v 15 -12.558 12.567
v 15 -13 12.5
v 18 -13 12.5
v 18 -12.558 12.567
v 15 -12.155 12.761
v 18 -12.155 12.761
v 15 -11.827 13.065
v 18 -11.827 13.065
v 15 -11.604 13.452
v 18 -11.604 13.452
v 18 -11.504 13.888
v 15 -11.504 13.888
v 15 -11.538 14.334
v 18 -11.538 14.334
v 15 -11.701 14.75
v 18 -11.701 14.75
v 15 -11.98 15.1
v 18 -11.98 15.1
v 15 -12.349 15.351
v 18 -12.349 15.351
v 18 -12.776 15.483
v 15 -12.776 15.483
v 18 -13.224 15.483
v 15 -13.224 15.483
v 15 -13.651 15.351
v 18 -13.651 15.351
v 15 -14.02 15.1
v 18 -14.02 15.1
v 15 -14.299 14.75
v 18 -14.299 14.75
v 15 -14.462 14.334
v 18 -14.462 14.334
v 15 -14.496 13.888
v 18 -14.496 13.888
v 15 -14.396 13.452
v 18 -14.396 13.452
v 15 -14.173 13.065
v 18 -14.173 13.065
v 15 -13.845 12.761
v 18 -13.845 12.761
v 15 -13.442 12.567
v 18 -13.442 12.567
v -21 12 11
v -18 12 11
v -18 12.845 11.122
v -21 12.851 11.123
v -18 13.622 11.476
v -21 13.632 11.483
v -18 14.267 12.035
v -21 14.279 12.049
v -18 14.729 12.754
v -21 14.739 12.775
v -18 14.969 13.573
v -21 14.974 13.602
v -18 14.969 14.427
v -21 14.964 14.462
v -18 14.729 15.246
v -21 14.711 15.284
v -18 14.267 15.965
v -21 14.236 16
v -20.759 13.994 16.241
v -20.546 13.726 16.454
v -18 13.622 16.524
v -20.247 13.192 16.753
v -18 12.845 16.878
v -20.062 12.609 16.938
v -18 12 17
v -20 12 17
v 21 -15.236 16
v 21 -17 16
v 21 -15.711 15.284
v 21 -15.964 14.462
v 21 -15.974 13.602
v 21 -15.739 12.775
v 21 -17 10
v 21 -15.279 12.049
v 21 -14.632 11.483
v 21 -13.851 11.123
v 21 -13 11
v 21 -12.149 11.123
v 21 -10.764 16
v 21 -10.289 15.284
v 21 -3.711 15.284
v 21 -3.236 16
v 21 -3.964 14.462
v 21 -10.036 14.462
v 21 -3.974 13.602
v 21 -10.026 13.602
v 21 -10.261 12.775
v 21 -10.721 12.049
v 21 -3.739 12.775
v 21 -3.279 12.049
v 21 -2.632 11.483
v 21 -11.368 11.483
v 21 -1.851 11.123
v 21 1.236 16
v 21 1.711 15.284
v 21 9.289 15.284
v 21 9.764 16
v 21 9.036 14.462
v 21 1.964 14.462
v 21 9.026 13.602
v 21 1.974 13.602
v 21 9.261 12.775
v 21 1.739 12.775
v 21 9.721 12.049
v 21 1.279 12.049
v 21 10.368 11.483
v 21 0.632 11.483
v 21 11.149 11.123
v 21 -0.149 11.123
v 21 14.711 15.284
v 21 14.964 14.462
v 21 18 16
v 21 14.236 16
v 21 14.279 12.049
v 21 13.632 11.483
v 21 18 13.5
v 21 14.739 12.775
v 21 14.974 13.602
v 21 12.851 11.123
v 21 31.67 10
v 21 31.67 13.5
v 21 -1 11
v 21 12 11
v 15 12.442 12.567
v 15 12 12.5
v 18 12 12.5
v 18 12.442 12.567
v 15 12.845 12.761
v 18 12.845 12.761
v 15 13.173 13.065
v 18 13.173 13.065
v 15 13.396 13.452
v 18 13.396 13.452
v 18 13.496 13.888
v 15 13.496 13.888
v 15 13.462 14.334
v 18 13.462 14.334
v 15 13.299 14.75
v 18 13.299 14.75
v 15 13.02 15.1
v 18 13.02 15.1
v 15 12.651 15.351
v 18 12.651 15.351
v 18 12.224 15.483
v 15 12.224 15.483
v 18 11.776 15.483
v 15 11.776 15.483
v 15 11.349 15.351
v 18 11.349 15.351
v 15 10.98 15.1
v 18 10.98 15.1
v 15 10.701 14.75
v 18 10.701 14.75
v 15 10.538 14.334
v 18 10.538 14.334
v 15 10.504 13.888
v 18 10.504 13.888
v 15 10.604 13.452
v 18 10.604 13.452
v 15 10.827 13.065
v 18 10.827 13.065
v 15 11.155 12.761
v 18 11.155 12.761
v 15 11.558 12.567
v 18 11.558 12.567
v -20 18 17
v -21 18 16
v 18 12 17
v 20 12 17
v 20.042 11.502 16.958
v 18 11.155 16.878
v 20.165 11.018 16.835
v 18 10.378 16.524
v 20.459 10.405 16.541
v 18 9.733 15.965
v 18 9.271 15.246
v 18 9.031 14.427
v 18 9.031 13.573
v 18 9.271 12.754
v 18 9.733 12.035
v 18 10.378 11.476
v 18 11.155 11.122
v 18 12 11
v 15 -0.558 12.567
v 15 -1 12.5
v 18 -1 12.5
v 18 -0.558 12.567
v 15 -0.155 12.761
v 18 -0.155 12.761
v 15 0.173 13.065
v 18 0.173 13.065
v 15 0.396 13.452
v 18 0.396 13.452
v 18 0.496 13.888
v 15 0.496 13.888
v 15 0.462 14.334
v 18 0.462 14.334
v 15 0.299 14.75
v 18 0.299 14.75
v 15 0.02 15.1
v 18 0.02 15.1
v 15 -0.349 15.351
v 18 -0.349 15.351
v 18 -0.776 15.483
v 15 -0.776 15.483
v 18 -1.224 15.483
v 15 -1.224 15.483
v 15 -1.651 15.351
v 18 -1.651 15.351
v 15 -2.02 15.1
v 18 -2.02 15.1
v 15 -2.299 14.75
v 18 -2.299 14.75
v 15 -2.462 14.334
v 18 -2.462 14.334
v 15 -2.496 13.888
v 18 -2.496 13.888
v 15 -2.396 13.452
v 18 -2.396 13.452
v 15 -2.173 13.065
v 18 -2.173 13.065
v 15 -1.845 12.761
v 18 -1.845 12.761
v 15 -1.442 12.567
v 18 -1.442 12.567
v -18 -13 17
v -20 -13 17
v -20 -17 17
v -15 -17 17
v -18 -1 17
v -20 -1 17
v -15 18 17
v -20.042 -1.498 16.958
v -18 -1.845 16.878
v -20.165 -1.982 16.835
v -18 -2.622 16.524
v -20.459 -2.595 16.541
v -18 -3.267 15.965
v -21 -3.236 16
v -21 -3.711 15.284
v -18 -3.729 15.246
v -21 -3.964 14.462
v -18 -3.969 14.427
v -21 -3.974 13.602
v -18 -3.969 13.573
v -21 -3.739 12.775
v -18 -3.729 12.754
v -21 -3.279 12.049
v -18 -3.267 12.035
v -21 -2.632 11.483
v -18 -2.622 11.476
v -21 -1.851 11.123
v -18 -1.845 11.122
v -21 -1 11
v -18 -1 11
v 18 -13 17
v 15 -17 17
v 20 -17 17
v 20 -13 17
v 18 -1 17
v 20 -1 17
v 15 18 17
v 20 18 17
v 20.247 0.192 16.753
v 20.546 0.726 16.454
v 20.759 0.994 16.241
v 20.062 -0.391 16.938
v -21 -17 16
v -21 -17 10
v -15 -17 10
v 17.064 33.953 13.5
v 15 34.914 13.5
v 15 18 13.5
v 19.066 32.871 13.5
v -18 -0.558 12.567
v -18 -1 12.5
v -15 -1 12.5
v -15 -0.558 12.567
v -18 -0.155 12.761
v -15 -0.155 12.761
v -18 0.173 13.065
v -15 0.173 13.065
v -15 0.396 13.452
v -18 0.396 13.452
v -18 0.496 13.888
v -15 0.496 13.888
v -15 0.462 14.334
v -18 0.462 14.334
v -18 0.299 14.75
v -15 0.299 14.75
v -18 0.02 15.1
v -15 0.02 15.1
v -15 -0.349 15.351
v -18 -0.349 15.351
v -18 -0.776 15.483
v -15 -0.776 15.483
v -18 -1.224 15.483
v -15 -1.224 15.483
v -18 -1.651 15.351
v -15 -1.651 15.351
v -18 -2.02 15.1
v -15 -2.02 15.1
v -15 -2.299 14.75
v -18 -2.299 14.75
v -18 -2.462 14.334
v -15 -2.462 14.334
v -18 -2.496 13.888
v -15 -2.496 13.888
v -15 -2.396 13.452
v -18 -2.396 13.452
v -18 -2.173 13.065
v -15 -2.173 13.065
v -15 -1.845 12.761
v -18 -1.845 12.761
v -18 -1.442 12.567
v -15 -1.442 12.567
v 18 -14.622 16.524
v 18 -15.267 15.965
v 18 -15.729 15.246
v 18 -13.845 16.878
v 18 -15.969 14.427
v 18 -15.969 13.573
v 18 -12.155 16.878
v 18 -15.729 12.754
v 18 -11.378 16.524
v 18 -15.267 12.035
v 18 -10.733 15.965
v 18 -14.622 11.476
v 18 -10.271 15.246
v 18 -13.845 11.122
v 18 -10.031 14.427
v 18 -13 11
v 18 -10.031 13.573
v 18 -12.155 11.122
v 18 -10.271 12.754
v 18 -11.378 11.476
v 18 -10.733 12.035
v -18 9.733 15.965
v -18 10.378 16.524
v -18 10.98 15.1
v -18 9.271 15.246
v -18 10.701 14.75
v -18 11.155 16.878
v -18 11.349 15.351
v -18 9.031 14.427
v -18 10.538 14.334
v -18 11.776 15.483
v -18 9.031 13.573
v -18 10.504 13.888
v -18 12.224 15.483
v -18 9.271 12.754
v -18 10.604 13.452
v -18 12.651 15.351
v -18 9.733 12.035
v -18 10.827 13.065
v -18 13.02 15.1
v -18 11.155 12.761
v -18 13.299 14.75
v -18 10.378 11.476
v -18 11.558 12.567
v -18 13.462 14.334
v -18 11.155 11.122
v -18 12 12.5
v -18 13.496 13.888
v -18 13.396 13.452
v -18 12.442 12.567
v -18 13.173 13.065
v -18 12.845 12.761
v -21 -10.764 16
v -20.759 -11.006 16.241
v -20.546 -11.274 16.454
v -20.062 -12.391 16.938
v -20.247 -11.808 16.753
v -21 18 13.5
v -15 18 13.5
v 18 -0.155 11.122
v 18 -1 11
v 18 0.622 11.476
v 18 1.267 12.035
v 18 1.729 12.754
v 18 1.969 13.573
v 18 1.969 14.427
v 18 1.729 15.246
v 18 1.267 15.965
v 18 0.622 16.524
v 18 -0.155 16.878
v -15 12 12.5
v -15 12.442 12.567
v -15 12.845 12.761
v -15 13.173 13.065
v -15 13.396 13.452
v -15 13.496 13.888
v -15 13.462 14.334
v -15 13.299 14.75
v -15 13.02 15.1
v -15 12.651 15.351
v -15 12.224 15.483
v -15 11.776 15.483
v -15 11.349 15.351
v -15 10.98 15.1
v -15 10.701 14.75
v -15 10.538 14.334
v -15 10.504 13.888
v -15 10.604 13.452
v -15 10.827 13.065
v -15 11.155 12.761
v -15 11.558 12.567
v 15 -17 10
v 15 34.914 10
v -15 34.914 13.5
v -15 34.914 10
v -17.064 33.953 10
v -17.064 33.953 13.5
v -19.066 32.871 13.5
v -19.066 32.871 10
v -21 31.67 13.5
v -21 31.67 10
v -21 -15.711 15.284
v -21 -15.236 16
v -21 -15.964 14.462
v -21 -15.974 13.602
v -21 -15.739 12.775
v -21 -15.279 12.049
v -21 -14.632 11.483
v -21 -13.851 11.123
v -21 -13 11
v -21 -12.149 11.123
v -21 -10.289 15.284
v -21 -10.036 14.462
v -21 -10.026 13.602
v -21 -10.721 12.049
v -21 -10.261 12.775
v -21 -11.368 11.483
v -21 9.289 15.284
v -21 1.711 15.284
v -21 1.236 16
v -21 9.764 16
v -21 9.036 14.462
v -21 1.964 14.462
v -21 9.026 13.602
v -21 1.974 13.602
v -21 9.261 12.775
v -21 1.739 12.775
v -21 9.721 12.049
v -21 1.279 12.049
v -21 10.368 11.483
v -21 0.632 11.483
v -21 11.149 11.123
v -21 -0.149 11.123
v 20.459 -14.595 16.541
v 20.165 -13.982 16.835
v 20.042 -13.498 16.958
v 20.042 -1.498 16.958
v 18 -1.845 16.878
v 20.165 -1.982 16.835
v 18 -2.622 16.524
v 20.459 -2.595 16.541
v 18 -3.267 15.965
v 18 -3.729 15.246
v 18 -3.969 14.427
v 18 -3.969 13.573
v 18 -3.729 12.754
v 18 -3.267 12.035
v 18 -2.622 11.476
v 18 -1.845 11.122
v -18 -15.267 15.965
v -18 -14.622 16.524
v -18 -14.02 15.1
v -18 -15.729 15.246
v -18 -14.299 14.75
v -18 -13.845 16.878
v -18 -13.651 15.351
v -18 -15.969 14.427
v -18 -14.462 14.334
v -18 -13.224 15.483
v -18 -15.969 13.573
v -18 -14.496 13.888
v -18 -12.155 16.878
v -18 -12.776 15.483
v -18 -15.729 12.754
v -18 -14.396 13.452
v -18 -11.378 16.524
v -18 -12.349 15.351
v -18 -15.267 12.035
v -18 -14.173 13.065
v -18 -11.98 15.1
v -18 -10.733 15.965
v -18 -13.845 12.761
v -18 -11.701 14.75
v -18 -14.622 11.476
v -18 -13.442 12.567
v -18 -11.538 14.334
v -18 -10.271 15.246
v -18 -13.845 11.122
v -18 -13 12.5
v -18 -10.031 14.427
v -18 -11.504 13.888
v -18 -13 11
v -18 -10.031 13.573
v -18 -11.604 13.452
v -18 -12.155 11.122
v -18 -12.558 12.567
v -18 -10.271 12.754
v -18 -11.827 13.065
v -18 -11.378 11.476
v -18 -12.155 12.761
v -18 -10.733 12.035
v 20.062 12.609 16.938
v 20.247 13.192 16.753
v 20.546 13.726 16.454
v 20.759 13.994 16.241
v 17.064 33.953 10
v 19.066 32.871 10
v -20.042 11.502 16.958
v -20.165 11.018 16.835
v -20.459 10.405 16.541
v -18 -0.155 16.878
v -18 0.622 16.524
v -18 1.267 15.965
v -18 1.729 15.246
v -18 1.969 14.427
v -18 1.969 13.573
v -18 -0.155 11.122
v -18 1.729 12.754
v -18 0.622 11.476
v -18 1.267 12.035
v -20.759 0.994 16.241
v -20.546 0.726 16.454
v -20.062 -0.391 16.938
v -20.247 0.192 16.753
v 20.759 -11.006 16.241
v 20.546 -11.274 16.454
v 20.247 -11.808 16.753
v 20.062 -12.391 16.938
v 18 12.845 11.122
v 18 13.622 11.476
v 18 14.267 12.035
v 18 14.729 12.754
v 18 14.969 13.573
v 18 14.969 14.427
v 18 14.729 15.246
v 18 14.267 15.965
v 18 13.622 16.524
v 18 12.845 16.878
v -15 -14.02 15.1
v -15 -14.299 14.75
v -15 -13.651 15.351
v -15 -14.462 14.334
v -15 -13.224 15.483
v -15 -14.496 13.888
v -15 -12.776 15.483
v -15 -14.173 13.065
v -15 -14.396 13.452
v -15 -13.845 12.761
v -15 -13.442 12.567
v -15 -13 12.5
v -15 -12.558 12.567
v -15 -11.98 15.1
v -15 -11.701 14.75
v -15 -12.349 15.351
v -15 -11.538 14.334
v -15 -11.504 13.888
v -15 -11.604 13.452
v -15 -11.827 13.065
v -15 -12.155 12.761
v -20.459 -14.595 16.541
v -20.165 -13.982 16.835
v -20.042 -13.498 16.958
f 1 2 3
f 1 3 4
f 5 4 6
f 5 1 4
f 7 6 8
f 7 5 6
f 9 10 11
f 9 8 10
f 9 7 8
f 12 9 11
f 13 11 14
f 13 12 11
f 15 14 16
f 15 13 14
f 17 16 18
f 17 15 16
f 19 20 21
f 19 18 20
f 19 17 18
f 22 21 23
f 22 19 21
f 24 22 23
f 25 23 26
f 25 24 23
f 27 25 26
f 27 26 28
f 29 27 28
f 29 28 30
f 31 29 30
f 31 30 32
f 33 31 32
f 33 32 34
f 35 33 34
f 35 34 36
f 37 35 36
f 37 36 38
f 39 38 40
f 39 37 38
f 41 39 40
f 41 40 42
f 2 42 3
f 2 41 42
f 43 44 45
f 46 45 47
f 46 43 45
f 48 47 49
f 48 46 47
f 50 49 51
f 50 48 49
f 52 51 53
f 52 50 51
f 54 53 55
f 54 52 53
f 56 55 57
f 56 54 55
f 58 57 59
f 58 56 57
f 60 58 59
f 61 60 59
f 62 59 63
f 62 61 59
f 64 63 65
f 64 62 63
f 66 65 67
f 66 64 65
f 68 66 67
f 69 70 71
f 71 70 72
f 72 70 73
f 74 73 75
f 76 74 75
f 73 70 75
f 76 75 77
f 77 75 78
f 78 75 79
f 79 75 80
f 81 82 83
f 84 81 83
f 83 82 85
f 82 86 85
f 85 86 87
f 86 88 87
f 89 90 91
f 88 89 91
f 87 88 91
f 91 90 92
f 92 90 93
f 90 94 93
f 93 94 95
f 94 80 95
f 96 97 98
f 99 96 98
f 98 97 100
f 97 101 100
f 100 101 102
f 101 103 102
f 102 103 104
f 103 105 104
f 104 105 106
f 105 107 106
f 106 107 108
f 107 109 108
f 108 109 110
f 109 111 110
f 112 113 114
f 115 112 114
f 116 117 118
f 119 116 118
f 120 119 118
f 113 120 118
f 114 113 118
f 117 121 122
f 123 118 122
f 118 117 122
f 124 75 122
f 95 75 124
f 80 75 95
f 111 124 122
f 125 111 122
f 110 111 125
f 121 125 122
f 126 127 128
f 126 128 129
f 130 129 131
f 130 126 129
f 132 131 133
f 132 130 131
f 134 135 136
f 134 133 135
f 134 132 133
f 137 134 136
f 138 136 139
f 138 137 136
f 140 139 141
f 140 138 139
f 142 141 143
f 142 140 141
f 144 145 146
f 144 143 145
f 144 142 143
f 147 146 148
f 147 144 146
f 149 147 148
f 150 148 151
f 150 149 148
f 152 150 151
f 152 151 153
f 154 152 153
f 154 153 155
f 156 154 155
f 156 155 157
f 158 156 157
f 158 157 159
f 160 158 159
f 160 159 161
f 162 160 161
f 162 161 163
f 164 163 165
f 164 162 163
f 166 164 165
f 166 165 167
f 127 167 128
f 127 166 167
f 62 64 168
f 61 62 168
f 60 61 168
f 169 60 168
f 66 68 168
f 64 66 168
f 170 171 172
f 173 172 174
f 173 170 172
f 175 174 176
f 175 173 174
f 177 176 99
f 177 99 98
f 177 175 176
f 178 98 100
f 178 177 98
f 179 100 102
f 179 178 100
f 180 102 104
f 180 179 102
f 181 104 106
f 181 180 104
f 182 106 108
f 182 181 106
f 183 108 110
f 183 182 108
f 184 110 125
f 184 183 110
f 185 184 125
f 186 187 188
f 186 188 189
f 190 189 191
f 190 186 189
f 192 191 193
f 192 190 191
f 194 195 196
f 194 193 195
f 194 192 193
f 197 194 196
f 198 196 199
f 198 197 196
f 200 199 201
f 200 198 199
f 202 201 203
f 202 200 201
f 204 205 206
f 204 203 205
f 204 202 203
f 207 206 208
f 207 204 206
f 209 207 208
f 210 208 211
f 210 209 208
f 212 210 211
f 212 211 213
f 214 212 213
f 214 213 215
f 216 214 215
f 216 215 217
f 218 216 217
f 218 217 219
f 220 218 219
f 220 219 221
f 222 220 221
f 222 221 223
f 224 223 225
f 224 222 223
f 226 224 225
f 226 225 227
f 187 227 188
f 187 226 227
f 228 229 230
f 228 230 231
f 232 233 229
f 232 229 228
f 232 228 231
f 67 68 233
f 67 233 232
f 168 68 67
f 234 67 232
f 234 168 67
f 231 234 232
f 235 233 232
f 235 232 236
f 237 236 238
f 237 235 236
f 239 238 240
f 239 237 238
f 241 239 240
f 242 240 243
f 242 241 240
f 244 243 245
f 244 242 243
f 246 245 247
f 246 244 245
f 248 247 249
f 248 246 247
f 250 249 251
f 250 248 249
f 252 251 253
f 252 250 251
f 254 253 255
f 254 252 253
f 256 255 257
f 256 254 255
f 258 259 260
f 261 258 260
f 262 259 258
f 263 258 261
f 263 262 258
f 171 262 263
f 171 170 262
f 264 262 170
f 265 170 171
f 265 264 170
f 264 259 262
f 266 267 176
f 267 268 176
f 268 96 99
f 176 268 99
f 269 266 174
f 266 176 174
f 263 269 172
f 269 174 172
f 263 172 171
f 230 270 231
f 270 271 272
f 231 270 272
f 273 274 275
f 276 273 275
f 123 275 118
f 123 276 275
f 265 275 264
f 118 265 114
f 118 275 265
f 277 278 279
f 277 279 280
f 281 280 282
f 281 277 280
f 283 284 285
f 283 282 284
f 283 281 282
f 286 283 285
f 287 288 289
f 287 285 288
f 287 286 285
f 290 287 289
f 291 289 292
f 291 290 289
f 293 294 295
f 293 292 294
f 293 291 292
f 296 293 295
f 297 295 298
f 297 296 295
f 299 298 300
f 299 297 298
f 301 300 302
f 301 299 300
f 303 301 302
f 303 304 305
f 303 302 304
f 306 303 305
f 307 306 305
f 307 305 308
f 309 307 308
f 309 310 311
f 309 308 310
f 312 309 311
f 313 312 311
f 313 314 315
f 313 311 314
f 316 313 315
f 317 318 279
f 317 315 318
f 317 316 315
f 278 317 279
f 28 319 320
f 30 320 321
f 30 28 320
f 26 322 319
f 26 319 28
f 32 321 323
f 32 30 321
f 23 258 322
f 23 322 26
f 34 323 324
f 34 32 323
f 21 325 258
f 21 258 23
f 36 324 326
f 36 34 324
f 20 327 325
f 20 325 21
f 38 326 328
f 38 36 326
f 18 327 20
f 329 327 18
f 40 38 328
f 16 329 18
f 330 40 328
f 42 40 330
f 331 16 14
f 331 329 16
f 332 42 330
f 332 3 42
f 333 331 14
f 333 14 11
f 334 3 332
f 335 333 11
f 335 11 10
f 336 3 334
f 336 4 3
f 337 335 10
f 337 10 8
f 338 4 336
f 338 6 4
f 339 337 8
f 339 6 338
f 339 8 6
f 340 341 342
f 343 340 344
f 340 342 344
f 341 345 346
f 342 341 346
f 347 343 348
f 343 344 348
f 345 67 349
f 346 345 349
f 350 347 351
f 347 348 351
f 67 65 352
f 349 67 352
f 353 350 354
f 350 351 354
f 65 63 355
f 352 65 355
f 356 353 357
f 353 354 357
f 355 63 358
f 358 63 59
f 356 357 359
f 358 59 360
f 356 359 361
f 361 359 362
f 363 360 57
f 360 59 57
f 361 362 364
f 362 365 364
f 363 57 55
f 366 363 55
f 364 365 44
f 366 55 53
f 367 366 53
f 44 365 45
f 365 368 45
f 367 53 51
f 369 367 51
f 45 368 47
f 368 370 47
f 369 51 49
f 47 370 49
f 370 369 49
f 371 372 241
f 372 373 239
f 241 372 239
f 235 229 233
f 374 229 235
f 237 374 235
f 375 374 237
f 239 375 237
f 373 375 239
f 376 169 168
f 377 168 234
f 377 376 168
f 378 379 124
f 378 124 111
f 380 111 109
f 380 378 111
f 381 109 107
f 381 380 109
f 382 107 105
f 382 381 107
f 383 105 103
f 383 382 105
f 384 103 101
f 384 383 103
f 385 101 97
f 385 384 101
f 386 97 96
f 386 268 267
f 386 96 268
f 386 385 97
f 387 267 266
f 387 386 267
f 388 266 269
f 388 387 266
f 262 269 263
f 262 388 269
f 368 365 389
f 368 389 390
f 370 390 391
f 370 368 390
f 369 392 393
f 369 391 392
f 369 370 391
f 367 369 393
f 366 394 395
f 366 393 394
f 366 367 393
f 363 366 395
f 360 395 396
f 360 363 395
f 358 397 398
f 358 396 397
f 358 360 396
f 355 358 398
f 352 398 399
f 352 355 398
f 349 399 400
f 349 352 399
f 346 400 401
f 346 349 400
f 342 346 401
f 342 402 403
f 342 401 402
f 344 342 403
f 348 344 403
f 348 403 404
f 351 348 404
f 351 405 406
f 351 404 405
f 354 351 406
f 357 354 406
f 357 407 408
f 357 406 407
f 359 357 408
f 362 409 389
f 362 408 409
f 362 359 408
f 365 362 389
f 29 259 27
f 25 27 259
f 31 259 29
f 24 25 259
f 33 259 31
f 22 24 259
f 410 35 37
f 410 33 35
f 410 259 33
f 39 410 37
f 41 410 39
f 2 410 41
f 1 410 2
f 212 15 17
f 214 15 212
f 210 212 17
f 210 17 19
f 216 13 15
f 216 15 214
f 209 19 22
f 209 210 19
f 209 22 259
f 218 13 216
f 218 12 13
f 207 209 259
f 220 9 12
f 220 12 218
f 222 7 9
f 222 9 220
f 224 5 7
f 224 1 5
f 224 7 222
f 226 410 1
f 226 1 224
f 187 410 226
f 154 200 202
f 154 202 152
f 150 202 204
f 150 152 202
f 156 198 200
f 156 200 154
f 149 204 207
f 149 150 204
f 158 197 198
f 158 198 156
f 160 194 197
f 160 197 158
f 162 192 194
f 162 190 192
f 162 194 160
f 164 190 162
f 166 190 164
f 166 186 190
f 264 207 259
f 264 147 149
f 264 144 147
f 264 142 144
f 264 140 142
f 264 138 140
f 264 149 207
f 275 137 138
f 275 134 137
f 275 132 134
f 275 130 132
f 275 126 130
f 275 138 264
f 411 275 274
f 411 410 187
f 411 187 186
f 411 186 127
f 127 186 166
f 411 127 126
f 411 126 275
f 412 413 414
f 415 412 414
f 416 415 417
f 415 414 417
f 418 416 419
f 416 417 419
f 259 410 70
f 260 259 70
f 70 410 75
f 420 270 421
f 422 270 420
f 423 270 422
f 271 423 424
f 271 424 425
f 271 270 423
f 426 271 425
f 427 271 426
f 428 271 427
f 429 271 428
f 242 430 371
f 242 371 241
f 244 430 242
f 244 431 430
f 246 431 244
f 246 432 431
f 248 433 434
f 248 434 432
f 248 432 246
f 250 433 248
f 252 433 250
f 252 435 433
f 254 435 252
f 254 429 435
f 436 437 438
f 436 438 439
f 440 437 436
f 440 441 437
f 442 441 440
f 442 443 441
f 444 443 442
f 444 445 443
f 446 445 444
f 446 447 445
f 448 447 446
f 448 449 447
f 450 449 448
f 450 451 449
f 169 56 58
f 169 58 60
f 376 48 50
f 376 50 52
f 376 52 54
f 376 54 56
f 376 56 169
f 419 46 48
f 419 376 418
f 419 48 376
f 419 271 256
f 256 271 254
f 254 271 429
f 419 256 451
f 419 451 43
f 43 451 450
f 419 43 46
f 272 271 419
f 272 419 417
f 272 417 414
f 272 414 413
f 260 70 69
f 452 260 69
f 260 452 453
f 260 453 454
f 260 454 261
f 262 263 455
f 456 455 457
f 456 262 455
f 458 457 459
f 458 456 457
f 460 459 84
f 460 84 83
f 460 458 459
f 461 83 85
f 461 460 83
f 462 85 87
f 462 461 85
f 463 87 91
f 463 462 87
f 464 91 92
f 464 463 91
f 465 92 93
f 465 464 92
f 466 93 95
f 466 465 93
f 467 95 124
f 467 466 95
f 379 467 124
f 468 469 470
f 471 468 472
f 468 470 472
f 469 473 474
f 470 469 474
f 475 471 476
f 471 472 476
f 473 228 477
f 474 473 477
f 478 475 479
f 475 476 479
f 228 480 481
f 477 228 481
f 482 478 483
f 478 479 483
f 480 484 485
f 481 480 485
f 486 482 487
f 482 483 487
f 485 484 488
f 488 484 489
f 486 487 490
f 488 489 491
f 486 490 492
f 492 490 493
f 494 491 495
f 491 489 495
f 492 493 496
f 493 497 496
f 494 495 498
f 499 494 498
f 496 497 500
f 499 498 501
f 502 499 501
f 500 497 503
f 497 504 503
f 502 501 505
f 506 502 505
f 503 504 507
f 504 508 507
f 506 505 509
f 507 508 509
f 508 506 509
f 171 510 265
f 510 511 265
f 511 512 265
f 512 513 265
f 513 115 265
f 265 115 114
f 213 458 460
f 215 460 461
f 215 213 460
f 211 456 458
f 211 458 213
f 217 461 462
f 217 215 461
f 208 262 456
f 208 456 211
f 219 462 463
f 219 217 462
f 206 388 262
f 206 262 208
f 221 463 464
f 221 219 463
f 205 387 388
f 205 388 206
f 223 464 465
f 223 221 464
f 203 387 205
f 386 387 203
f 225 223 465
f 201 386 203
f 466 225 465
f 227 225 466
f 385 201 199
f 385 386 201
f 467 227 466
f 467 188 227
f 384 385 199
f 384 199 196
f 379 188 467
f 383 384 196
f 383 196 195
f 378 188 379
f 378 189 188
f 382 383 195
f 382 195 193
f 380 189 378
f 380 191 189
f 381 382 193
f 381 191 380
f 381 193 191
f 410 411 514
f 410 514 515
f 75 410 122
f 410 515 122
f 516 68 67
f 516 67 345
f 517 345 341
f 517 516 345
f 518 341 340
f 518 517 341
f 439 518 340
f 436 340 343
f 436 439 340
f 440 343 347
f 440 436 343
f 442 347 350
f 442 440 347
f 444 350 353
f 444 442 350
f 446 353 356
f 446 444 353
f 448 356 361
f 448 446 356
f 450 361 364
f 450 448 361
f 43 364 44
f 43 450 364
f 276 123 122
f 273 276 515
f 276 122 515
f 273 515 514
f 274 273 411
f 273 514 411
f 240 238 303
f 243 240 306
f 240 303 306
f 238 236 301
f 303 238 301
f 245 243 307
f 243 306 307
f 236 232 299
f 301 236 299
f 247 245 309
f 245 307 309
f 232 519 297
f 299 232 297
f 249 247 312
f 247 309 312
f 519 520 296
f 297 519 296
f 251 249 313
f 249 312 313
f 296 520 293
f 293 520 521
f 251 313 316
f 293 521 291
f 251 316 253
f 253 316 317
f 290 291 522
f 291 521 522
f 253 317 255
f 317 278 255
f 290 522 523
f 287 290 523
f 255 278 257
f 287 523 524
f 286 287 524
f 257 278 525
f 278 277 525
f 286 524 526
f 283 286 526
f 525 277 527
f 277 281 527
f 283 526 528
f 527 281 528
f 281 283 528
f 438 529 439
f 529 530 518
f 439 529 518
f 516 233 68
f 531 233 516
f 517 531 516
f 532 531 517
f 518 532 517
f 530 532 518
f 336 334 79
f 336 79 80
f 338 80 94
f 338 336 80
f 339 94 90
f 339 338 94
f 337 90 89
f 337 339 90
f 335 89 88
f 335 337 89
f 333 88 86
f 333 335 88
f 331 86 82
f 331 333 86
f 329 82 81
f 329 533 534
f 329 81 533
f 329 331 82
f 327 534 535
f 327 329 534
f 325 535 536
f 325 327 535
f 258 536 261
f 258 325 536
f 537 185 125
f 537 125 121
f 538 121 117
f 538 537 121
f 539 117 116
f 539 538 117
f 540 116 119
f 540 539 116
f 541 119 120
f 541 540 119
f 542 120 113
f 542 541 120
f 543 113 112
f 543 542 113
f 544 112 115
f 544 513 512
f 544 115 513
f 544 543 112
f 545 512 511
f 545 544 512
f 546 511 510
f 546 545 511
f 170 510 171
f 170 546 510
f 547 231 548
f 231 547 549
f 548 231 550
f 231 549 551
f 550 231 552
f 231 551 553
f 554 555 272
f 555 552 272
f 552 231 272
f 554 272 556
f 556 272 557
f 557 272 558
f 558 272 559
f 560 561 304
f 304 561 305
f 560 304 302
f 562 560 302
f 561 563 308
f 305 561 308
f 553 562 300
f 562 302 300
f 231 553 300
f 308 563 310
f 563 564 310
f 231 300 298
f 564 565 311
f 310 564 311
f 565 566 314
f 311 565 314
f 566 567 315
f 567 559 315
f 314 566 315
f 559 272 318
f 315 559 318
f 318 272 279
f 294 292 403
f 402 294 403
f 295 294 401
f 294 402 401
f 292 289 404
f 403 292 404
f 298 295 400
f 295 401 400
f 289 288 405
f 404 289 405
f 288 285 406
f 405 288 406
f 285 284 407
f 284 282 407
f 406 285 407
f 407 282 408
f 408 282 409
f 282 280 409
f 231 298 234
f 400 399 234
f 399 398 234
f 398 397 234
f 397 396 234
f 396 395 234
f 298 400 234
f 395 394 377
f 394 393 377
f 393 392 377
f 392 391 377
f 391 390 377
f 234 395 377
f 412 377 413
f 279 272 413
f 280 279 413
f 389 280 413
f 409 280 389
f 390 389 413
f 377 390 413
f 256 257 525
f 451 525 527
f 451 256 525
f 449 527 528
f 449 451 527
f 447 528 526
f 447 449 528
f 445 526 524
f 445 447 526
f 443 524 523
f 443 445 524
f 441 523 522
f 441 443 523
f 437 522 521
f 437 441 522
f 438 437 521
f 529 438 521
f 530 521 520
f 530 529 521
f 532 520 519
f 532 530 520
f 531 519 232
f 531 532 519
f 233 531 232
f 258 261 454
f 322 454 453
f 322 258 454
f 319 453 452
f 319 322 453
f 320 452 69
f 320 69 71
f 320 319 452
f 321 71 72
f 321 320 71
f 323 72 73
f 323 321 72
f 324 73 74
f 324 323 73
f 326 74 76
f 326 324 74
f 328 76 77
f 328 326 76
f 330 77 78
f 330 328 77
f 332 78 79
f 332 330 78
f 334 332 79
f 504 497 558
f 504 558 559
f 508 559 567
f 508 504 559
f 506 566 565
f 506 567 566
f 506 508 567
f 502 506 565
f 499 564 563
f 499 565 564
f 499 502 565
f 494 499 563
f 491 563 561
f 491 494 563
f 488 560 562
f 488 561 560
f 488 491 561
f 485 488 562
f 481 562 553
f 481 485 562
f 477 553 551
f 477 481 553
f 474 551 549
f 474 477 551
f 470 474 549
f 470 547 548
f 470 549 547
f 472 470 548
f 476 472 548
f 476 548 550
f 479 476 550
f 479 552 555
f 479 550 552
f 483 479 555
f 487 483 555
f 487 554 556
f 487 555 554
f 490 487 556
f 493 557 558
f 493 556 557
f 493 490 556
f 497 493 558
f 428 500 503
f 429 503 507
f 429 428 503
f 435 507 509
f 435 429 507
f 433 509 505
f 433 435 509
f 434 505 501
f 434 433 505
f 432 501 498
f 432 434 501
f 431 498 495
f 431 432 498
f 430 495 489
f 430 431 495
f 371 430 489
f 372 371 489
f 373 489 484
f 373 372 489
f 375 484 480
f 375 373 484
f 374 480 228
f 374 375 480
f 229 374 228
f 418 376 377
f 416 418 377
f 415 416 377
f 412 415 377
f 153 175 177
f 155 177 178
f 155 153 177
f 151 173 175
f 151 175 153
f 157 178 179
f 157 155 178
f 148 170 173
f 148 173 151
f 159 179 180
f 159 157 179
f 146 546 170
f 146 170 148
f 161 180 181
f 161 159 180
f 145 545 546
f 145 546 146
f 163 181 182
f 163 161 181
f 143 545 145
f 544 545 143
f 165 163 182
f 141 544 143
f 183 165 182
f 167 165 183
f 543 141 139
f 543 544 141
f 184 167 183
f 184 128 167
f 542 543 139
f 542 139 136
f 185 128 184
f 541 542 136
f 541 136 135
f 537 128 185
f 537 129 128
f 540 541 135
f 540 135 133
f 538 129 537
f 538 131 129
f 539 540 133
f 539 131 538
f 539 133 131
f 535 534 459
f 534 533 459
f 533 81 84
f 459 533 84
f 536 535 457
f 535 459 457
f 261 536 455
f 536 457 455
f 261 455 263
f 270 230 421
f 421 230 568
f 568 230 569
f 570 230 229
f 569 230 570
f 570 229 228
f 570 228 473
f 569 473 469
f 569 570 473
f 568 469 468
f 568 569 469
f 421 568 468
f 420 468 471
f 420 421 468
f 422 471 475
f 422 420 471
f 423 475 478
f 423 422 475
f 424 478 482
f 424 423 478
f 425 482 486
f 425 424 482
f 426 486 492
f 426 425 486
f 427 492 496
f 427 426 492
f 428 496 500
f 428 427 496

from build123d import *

# Parameters (mm, degrees)
BOX1065_W          = 48
BOX1065_H          = 20
BOX1065_DEPTH      = 18
CYLINDER2846_R     = 1.5
CYLINDER2846_DEPTH = 64
CYLINDER2847_R     = 1.5
CYLINDER2847_DEPTH = 64
CYLINDER2838_R     = 1.5
CYLINDER2838_DEPTH = 64
CYLINDER2843_R     = 3
CYLINDER2843_DEPTH = 3
CYLINDER2849_R     = 3
CYLINDER2849_DEPTH = 3
CYLINDER2845_R     = 3
CYLINDER2845_DEPTH = 3
CYLINDER2844_R     = 3
CYLINDER2844_DEPTH = 3
CYLINDER2837_R     = 3
CYLINDER2837_DEPTH = 3
CYLINDER2848_R     = 3
CYLINDER2848_DEPTH = 3
CYLINDER2841_R     = 38
CYLINDER2841_DEPTH = 20
BOX1064_W          = 6
BOX1064_H          = 54
BOX1064_DEPTH      = 7
BOX1063_W          = 6
BOX1063_H          = 54
BOX1063_DEPTH      = 7
CHAMFER157_SIZE    = 1


with BuildPart() as krychle1064:
    # Box1065 → Box1065 (new body)
    with BuildSketch(Plane(origin=(-24, 18, 13.5), x_dir=(1, 0, 0), z_dir=(0, 0, 1))):
        with Locations((24, 10)):
            Rectangle(BOX1065_W, BOX1065_H)
    extrude(amount=BOX1065_DEPTH)


with BuildPart() as v_lec2816:
    # Cylinder2846 → Cylinder2846 (new body)
    with BuildSketch(Plane(origin=(-26, -11, 13), x_dir=(0, 0, -1), z_dir=(1, 0, 0))):
        Circle(CYLINDER2846_R)
    extrude(amount=CYLINDER2846_DEPTH)


with BuildPart() as v_lec2817:
    # Cylinder2847 → Cylinder2847 (new body)
    with BuildSketch(Plane(origin=(-26, 14, 13), x_dir=(0, 0, -1), z_dir=(1, 0, 0))):
        Circle(CYLINDER2847_R)
    extrude(amount=CYLINDER2847_DEPTH)


with BuildPart() as compound1268:
    # Cylinder2838 → Cylinder2838 (new body)
    with BuildSketch(Plane(origin=(-26, 1, 13), x_dir=(0, 0, -1), z_dir=(1, 0, 0))):
        Circle(CYLINDER2838_R)
    extrude(amount=CYLINDER2838_DEPTH)

    # Compound1268: union Válec2816, Válec2817
    add(v_lec2816.part)
    add(v_lec2817.part)


with BuildPart() as compound1268_1:
    # Compound1268 placement: moved
    add(compound1268.part.moved(Location((0, -2, 1))))


with BuildPart() as v_lec2813:
    # Cylinder2843 → Cylinder2843 (new body)
    with BuildSketch(Plane(origin=(-26, -11, 13), x_dir=(0, 0, -1), z_dir=(1, 0, 0))):
        Circle(CYLINDER2843_R)
    extrude(amount=CYLINDER2843_DEPTH)


with BuildPart() as v_lec2819:
    # Cylinder2849 → Cylinder2849 (new body)
    with BuildSketch(Plane(origin=(-26, 14, 13), x_dir=(0, 0, -1), z_dir=(1, 0, 0))):
        Circle(CYLINDER2849_R)
    extrude(amount=CYLINDER2849_DEPTH)


with BuildPart() as compound1270:
    # Cylinder2845 → Cylinder2845 (new body)
    with BuildSketch(Plane(origin=(-26, 1, 13), x_dir=(0, 0, -1), z_dir=(1, 0, 0))):
        Circle(CYLINDER2845_R)
    extrude(amount=CYLINDER2845_DEPTH)

    # Compound1270: union Válec2813, Válec2819
    add(v_lec2813.part)
    add(v_lec2819.part)


with BuildPart() as compound1270_1:
    # Compound1270 placement: moved
    add(compound1270.part.moved(Location((5, -2, 1))))


with BuildPart() as v_lec2814:
    # Cylinder2844 → Cylinder2844 (new body)
    with BuildSketch(Plane(origin=(-26, -11, 13), x_dir=(0, 0, -1), z_dir=(1, 0, 0))):
        Circle(CYLINDER2844_R)
    extrude(amount=CYLINDER2844_DEPTH)


with BuildPart() as v_lec2807:
    # Cylinder2837 → Cylinder2837 (new body)
    with BuildSketch(Plane(origin=(-26, 14, 13), x_dir=(0, 0, -1), z_dir=(1, 0, 0))):
        Circle(CYLINDER2837_R)
    extrude(amount=CYLINDER2837_DEPTH)


with BuildPart() as compound1269:
    # Cylinder2848 → Cylinder2848 (new body)
    with BuildSketch(Plane(origin=(-26, 1, 13), x_dir=(0, 0, -1), z_dir=(1, 0, 0))):
        Circle(CYLINDER2848_R)
    extrude(amount=CYLINDER2848_DEPTH)

    # Compound1269: union Válec2814, Válec2807
    add(v_lec2814.part)
    add(v_lec2807.part)


with BuildPart() as compound1269_1:
    # Compound1269 placement: moved
    add(compound1269.part.moved(Location((44, -2, 1))))


with BuildPart() as v_lec2811:
    # Cylinder2841 → Cylinder2841 (new body)
    with BuildSketch(Plane.XY):
        Circle(CYLINDER2841_R)
    extrude(amount=CYLINDER2841_DEPTH)


with BuildPart() as krychle1063:
    # Box1064 → Box1064 (new body)
    with BuildSketch(Plane(origin=(-21, -17, 10), x_dir=(1, 0, 0), z_dir=(0, 0, 1))):
        with Locations((3, 27)):
            Rectangle(BOX1064_W, BOX1064_H)
    extrude(amount=BOX1064_DEPTH)


with BuildPart() as cut1085:
    # Box1063 → Box1063 (new body)
    with BuildSketch(Plane(origin=(15, -17, 10), x_dir=(1, 0, 0), z_dir=(0, 0, 1))):
        with Locations((3, 27)):
            Rectangle(BOX1063_W, BOX1063_H)
    extrude(amount=BOX1063_DEPTH)

    # Compound1263: union Krychle1063
    add(krychle1063.part)

    # Common013: intersect Válec2811
    add(v_lec2811.part, mode=Mode.INTERSECT)

    # Chamfer157
    chamfer157_edges = [cut1085.edges().sort_by_distance(p)[0] for p in [
        (21, 7.335088, 17),
        (-21, 7.335088, 17),
    ]]
    chamfer(chamfer157_edges, length=CHAMFER157_SIZE)

    # Cut1081: cut Compound1269
    add(compound1269_1.part, mode=Mode.SUBTRACT)

    # Cut1079: cut Compound1270
    add(compound1270_1.part, mode=Mode.SUBTRACT)

    # Cut1082: cut Compound1268
    add(compound1268_1.part, mode=Mode.SUBTRACT)

    # Cut1085: cut Krychle1064
    add(krychle1064.part, mode=Mode.SUBTRACT)


solid = cut1085.part
